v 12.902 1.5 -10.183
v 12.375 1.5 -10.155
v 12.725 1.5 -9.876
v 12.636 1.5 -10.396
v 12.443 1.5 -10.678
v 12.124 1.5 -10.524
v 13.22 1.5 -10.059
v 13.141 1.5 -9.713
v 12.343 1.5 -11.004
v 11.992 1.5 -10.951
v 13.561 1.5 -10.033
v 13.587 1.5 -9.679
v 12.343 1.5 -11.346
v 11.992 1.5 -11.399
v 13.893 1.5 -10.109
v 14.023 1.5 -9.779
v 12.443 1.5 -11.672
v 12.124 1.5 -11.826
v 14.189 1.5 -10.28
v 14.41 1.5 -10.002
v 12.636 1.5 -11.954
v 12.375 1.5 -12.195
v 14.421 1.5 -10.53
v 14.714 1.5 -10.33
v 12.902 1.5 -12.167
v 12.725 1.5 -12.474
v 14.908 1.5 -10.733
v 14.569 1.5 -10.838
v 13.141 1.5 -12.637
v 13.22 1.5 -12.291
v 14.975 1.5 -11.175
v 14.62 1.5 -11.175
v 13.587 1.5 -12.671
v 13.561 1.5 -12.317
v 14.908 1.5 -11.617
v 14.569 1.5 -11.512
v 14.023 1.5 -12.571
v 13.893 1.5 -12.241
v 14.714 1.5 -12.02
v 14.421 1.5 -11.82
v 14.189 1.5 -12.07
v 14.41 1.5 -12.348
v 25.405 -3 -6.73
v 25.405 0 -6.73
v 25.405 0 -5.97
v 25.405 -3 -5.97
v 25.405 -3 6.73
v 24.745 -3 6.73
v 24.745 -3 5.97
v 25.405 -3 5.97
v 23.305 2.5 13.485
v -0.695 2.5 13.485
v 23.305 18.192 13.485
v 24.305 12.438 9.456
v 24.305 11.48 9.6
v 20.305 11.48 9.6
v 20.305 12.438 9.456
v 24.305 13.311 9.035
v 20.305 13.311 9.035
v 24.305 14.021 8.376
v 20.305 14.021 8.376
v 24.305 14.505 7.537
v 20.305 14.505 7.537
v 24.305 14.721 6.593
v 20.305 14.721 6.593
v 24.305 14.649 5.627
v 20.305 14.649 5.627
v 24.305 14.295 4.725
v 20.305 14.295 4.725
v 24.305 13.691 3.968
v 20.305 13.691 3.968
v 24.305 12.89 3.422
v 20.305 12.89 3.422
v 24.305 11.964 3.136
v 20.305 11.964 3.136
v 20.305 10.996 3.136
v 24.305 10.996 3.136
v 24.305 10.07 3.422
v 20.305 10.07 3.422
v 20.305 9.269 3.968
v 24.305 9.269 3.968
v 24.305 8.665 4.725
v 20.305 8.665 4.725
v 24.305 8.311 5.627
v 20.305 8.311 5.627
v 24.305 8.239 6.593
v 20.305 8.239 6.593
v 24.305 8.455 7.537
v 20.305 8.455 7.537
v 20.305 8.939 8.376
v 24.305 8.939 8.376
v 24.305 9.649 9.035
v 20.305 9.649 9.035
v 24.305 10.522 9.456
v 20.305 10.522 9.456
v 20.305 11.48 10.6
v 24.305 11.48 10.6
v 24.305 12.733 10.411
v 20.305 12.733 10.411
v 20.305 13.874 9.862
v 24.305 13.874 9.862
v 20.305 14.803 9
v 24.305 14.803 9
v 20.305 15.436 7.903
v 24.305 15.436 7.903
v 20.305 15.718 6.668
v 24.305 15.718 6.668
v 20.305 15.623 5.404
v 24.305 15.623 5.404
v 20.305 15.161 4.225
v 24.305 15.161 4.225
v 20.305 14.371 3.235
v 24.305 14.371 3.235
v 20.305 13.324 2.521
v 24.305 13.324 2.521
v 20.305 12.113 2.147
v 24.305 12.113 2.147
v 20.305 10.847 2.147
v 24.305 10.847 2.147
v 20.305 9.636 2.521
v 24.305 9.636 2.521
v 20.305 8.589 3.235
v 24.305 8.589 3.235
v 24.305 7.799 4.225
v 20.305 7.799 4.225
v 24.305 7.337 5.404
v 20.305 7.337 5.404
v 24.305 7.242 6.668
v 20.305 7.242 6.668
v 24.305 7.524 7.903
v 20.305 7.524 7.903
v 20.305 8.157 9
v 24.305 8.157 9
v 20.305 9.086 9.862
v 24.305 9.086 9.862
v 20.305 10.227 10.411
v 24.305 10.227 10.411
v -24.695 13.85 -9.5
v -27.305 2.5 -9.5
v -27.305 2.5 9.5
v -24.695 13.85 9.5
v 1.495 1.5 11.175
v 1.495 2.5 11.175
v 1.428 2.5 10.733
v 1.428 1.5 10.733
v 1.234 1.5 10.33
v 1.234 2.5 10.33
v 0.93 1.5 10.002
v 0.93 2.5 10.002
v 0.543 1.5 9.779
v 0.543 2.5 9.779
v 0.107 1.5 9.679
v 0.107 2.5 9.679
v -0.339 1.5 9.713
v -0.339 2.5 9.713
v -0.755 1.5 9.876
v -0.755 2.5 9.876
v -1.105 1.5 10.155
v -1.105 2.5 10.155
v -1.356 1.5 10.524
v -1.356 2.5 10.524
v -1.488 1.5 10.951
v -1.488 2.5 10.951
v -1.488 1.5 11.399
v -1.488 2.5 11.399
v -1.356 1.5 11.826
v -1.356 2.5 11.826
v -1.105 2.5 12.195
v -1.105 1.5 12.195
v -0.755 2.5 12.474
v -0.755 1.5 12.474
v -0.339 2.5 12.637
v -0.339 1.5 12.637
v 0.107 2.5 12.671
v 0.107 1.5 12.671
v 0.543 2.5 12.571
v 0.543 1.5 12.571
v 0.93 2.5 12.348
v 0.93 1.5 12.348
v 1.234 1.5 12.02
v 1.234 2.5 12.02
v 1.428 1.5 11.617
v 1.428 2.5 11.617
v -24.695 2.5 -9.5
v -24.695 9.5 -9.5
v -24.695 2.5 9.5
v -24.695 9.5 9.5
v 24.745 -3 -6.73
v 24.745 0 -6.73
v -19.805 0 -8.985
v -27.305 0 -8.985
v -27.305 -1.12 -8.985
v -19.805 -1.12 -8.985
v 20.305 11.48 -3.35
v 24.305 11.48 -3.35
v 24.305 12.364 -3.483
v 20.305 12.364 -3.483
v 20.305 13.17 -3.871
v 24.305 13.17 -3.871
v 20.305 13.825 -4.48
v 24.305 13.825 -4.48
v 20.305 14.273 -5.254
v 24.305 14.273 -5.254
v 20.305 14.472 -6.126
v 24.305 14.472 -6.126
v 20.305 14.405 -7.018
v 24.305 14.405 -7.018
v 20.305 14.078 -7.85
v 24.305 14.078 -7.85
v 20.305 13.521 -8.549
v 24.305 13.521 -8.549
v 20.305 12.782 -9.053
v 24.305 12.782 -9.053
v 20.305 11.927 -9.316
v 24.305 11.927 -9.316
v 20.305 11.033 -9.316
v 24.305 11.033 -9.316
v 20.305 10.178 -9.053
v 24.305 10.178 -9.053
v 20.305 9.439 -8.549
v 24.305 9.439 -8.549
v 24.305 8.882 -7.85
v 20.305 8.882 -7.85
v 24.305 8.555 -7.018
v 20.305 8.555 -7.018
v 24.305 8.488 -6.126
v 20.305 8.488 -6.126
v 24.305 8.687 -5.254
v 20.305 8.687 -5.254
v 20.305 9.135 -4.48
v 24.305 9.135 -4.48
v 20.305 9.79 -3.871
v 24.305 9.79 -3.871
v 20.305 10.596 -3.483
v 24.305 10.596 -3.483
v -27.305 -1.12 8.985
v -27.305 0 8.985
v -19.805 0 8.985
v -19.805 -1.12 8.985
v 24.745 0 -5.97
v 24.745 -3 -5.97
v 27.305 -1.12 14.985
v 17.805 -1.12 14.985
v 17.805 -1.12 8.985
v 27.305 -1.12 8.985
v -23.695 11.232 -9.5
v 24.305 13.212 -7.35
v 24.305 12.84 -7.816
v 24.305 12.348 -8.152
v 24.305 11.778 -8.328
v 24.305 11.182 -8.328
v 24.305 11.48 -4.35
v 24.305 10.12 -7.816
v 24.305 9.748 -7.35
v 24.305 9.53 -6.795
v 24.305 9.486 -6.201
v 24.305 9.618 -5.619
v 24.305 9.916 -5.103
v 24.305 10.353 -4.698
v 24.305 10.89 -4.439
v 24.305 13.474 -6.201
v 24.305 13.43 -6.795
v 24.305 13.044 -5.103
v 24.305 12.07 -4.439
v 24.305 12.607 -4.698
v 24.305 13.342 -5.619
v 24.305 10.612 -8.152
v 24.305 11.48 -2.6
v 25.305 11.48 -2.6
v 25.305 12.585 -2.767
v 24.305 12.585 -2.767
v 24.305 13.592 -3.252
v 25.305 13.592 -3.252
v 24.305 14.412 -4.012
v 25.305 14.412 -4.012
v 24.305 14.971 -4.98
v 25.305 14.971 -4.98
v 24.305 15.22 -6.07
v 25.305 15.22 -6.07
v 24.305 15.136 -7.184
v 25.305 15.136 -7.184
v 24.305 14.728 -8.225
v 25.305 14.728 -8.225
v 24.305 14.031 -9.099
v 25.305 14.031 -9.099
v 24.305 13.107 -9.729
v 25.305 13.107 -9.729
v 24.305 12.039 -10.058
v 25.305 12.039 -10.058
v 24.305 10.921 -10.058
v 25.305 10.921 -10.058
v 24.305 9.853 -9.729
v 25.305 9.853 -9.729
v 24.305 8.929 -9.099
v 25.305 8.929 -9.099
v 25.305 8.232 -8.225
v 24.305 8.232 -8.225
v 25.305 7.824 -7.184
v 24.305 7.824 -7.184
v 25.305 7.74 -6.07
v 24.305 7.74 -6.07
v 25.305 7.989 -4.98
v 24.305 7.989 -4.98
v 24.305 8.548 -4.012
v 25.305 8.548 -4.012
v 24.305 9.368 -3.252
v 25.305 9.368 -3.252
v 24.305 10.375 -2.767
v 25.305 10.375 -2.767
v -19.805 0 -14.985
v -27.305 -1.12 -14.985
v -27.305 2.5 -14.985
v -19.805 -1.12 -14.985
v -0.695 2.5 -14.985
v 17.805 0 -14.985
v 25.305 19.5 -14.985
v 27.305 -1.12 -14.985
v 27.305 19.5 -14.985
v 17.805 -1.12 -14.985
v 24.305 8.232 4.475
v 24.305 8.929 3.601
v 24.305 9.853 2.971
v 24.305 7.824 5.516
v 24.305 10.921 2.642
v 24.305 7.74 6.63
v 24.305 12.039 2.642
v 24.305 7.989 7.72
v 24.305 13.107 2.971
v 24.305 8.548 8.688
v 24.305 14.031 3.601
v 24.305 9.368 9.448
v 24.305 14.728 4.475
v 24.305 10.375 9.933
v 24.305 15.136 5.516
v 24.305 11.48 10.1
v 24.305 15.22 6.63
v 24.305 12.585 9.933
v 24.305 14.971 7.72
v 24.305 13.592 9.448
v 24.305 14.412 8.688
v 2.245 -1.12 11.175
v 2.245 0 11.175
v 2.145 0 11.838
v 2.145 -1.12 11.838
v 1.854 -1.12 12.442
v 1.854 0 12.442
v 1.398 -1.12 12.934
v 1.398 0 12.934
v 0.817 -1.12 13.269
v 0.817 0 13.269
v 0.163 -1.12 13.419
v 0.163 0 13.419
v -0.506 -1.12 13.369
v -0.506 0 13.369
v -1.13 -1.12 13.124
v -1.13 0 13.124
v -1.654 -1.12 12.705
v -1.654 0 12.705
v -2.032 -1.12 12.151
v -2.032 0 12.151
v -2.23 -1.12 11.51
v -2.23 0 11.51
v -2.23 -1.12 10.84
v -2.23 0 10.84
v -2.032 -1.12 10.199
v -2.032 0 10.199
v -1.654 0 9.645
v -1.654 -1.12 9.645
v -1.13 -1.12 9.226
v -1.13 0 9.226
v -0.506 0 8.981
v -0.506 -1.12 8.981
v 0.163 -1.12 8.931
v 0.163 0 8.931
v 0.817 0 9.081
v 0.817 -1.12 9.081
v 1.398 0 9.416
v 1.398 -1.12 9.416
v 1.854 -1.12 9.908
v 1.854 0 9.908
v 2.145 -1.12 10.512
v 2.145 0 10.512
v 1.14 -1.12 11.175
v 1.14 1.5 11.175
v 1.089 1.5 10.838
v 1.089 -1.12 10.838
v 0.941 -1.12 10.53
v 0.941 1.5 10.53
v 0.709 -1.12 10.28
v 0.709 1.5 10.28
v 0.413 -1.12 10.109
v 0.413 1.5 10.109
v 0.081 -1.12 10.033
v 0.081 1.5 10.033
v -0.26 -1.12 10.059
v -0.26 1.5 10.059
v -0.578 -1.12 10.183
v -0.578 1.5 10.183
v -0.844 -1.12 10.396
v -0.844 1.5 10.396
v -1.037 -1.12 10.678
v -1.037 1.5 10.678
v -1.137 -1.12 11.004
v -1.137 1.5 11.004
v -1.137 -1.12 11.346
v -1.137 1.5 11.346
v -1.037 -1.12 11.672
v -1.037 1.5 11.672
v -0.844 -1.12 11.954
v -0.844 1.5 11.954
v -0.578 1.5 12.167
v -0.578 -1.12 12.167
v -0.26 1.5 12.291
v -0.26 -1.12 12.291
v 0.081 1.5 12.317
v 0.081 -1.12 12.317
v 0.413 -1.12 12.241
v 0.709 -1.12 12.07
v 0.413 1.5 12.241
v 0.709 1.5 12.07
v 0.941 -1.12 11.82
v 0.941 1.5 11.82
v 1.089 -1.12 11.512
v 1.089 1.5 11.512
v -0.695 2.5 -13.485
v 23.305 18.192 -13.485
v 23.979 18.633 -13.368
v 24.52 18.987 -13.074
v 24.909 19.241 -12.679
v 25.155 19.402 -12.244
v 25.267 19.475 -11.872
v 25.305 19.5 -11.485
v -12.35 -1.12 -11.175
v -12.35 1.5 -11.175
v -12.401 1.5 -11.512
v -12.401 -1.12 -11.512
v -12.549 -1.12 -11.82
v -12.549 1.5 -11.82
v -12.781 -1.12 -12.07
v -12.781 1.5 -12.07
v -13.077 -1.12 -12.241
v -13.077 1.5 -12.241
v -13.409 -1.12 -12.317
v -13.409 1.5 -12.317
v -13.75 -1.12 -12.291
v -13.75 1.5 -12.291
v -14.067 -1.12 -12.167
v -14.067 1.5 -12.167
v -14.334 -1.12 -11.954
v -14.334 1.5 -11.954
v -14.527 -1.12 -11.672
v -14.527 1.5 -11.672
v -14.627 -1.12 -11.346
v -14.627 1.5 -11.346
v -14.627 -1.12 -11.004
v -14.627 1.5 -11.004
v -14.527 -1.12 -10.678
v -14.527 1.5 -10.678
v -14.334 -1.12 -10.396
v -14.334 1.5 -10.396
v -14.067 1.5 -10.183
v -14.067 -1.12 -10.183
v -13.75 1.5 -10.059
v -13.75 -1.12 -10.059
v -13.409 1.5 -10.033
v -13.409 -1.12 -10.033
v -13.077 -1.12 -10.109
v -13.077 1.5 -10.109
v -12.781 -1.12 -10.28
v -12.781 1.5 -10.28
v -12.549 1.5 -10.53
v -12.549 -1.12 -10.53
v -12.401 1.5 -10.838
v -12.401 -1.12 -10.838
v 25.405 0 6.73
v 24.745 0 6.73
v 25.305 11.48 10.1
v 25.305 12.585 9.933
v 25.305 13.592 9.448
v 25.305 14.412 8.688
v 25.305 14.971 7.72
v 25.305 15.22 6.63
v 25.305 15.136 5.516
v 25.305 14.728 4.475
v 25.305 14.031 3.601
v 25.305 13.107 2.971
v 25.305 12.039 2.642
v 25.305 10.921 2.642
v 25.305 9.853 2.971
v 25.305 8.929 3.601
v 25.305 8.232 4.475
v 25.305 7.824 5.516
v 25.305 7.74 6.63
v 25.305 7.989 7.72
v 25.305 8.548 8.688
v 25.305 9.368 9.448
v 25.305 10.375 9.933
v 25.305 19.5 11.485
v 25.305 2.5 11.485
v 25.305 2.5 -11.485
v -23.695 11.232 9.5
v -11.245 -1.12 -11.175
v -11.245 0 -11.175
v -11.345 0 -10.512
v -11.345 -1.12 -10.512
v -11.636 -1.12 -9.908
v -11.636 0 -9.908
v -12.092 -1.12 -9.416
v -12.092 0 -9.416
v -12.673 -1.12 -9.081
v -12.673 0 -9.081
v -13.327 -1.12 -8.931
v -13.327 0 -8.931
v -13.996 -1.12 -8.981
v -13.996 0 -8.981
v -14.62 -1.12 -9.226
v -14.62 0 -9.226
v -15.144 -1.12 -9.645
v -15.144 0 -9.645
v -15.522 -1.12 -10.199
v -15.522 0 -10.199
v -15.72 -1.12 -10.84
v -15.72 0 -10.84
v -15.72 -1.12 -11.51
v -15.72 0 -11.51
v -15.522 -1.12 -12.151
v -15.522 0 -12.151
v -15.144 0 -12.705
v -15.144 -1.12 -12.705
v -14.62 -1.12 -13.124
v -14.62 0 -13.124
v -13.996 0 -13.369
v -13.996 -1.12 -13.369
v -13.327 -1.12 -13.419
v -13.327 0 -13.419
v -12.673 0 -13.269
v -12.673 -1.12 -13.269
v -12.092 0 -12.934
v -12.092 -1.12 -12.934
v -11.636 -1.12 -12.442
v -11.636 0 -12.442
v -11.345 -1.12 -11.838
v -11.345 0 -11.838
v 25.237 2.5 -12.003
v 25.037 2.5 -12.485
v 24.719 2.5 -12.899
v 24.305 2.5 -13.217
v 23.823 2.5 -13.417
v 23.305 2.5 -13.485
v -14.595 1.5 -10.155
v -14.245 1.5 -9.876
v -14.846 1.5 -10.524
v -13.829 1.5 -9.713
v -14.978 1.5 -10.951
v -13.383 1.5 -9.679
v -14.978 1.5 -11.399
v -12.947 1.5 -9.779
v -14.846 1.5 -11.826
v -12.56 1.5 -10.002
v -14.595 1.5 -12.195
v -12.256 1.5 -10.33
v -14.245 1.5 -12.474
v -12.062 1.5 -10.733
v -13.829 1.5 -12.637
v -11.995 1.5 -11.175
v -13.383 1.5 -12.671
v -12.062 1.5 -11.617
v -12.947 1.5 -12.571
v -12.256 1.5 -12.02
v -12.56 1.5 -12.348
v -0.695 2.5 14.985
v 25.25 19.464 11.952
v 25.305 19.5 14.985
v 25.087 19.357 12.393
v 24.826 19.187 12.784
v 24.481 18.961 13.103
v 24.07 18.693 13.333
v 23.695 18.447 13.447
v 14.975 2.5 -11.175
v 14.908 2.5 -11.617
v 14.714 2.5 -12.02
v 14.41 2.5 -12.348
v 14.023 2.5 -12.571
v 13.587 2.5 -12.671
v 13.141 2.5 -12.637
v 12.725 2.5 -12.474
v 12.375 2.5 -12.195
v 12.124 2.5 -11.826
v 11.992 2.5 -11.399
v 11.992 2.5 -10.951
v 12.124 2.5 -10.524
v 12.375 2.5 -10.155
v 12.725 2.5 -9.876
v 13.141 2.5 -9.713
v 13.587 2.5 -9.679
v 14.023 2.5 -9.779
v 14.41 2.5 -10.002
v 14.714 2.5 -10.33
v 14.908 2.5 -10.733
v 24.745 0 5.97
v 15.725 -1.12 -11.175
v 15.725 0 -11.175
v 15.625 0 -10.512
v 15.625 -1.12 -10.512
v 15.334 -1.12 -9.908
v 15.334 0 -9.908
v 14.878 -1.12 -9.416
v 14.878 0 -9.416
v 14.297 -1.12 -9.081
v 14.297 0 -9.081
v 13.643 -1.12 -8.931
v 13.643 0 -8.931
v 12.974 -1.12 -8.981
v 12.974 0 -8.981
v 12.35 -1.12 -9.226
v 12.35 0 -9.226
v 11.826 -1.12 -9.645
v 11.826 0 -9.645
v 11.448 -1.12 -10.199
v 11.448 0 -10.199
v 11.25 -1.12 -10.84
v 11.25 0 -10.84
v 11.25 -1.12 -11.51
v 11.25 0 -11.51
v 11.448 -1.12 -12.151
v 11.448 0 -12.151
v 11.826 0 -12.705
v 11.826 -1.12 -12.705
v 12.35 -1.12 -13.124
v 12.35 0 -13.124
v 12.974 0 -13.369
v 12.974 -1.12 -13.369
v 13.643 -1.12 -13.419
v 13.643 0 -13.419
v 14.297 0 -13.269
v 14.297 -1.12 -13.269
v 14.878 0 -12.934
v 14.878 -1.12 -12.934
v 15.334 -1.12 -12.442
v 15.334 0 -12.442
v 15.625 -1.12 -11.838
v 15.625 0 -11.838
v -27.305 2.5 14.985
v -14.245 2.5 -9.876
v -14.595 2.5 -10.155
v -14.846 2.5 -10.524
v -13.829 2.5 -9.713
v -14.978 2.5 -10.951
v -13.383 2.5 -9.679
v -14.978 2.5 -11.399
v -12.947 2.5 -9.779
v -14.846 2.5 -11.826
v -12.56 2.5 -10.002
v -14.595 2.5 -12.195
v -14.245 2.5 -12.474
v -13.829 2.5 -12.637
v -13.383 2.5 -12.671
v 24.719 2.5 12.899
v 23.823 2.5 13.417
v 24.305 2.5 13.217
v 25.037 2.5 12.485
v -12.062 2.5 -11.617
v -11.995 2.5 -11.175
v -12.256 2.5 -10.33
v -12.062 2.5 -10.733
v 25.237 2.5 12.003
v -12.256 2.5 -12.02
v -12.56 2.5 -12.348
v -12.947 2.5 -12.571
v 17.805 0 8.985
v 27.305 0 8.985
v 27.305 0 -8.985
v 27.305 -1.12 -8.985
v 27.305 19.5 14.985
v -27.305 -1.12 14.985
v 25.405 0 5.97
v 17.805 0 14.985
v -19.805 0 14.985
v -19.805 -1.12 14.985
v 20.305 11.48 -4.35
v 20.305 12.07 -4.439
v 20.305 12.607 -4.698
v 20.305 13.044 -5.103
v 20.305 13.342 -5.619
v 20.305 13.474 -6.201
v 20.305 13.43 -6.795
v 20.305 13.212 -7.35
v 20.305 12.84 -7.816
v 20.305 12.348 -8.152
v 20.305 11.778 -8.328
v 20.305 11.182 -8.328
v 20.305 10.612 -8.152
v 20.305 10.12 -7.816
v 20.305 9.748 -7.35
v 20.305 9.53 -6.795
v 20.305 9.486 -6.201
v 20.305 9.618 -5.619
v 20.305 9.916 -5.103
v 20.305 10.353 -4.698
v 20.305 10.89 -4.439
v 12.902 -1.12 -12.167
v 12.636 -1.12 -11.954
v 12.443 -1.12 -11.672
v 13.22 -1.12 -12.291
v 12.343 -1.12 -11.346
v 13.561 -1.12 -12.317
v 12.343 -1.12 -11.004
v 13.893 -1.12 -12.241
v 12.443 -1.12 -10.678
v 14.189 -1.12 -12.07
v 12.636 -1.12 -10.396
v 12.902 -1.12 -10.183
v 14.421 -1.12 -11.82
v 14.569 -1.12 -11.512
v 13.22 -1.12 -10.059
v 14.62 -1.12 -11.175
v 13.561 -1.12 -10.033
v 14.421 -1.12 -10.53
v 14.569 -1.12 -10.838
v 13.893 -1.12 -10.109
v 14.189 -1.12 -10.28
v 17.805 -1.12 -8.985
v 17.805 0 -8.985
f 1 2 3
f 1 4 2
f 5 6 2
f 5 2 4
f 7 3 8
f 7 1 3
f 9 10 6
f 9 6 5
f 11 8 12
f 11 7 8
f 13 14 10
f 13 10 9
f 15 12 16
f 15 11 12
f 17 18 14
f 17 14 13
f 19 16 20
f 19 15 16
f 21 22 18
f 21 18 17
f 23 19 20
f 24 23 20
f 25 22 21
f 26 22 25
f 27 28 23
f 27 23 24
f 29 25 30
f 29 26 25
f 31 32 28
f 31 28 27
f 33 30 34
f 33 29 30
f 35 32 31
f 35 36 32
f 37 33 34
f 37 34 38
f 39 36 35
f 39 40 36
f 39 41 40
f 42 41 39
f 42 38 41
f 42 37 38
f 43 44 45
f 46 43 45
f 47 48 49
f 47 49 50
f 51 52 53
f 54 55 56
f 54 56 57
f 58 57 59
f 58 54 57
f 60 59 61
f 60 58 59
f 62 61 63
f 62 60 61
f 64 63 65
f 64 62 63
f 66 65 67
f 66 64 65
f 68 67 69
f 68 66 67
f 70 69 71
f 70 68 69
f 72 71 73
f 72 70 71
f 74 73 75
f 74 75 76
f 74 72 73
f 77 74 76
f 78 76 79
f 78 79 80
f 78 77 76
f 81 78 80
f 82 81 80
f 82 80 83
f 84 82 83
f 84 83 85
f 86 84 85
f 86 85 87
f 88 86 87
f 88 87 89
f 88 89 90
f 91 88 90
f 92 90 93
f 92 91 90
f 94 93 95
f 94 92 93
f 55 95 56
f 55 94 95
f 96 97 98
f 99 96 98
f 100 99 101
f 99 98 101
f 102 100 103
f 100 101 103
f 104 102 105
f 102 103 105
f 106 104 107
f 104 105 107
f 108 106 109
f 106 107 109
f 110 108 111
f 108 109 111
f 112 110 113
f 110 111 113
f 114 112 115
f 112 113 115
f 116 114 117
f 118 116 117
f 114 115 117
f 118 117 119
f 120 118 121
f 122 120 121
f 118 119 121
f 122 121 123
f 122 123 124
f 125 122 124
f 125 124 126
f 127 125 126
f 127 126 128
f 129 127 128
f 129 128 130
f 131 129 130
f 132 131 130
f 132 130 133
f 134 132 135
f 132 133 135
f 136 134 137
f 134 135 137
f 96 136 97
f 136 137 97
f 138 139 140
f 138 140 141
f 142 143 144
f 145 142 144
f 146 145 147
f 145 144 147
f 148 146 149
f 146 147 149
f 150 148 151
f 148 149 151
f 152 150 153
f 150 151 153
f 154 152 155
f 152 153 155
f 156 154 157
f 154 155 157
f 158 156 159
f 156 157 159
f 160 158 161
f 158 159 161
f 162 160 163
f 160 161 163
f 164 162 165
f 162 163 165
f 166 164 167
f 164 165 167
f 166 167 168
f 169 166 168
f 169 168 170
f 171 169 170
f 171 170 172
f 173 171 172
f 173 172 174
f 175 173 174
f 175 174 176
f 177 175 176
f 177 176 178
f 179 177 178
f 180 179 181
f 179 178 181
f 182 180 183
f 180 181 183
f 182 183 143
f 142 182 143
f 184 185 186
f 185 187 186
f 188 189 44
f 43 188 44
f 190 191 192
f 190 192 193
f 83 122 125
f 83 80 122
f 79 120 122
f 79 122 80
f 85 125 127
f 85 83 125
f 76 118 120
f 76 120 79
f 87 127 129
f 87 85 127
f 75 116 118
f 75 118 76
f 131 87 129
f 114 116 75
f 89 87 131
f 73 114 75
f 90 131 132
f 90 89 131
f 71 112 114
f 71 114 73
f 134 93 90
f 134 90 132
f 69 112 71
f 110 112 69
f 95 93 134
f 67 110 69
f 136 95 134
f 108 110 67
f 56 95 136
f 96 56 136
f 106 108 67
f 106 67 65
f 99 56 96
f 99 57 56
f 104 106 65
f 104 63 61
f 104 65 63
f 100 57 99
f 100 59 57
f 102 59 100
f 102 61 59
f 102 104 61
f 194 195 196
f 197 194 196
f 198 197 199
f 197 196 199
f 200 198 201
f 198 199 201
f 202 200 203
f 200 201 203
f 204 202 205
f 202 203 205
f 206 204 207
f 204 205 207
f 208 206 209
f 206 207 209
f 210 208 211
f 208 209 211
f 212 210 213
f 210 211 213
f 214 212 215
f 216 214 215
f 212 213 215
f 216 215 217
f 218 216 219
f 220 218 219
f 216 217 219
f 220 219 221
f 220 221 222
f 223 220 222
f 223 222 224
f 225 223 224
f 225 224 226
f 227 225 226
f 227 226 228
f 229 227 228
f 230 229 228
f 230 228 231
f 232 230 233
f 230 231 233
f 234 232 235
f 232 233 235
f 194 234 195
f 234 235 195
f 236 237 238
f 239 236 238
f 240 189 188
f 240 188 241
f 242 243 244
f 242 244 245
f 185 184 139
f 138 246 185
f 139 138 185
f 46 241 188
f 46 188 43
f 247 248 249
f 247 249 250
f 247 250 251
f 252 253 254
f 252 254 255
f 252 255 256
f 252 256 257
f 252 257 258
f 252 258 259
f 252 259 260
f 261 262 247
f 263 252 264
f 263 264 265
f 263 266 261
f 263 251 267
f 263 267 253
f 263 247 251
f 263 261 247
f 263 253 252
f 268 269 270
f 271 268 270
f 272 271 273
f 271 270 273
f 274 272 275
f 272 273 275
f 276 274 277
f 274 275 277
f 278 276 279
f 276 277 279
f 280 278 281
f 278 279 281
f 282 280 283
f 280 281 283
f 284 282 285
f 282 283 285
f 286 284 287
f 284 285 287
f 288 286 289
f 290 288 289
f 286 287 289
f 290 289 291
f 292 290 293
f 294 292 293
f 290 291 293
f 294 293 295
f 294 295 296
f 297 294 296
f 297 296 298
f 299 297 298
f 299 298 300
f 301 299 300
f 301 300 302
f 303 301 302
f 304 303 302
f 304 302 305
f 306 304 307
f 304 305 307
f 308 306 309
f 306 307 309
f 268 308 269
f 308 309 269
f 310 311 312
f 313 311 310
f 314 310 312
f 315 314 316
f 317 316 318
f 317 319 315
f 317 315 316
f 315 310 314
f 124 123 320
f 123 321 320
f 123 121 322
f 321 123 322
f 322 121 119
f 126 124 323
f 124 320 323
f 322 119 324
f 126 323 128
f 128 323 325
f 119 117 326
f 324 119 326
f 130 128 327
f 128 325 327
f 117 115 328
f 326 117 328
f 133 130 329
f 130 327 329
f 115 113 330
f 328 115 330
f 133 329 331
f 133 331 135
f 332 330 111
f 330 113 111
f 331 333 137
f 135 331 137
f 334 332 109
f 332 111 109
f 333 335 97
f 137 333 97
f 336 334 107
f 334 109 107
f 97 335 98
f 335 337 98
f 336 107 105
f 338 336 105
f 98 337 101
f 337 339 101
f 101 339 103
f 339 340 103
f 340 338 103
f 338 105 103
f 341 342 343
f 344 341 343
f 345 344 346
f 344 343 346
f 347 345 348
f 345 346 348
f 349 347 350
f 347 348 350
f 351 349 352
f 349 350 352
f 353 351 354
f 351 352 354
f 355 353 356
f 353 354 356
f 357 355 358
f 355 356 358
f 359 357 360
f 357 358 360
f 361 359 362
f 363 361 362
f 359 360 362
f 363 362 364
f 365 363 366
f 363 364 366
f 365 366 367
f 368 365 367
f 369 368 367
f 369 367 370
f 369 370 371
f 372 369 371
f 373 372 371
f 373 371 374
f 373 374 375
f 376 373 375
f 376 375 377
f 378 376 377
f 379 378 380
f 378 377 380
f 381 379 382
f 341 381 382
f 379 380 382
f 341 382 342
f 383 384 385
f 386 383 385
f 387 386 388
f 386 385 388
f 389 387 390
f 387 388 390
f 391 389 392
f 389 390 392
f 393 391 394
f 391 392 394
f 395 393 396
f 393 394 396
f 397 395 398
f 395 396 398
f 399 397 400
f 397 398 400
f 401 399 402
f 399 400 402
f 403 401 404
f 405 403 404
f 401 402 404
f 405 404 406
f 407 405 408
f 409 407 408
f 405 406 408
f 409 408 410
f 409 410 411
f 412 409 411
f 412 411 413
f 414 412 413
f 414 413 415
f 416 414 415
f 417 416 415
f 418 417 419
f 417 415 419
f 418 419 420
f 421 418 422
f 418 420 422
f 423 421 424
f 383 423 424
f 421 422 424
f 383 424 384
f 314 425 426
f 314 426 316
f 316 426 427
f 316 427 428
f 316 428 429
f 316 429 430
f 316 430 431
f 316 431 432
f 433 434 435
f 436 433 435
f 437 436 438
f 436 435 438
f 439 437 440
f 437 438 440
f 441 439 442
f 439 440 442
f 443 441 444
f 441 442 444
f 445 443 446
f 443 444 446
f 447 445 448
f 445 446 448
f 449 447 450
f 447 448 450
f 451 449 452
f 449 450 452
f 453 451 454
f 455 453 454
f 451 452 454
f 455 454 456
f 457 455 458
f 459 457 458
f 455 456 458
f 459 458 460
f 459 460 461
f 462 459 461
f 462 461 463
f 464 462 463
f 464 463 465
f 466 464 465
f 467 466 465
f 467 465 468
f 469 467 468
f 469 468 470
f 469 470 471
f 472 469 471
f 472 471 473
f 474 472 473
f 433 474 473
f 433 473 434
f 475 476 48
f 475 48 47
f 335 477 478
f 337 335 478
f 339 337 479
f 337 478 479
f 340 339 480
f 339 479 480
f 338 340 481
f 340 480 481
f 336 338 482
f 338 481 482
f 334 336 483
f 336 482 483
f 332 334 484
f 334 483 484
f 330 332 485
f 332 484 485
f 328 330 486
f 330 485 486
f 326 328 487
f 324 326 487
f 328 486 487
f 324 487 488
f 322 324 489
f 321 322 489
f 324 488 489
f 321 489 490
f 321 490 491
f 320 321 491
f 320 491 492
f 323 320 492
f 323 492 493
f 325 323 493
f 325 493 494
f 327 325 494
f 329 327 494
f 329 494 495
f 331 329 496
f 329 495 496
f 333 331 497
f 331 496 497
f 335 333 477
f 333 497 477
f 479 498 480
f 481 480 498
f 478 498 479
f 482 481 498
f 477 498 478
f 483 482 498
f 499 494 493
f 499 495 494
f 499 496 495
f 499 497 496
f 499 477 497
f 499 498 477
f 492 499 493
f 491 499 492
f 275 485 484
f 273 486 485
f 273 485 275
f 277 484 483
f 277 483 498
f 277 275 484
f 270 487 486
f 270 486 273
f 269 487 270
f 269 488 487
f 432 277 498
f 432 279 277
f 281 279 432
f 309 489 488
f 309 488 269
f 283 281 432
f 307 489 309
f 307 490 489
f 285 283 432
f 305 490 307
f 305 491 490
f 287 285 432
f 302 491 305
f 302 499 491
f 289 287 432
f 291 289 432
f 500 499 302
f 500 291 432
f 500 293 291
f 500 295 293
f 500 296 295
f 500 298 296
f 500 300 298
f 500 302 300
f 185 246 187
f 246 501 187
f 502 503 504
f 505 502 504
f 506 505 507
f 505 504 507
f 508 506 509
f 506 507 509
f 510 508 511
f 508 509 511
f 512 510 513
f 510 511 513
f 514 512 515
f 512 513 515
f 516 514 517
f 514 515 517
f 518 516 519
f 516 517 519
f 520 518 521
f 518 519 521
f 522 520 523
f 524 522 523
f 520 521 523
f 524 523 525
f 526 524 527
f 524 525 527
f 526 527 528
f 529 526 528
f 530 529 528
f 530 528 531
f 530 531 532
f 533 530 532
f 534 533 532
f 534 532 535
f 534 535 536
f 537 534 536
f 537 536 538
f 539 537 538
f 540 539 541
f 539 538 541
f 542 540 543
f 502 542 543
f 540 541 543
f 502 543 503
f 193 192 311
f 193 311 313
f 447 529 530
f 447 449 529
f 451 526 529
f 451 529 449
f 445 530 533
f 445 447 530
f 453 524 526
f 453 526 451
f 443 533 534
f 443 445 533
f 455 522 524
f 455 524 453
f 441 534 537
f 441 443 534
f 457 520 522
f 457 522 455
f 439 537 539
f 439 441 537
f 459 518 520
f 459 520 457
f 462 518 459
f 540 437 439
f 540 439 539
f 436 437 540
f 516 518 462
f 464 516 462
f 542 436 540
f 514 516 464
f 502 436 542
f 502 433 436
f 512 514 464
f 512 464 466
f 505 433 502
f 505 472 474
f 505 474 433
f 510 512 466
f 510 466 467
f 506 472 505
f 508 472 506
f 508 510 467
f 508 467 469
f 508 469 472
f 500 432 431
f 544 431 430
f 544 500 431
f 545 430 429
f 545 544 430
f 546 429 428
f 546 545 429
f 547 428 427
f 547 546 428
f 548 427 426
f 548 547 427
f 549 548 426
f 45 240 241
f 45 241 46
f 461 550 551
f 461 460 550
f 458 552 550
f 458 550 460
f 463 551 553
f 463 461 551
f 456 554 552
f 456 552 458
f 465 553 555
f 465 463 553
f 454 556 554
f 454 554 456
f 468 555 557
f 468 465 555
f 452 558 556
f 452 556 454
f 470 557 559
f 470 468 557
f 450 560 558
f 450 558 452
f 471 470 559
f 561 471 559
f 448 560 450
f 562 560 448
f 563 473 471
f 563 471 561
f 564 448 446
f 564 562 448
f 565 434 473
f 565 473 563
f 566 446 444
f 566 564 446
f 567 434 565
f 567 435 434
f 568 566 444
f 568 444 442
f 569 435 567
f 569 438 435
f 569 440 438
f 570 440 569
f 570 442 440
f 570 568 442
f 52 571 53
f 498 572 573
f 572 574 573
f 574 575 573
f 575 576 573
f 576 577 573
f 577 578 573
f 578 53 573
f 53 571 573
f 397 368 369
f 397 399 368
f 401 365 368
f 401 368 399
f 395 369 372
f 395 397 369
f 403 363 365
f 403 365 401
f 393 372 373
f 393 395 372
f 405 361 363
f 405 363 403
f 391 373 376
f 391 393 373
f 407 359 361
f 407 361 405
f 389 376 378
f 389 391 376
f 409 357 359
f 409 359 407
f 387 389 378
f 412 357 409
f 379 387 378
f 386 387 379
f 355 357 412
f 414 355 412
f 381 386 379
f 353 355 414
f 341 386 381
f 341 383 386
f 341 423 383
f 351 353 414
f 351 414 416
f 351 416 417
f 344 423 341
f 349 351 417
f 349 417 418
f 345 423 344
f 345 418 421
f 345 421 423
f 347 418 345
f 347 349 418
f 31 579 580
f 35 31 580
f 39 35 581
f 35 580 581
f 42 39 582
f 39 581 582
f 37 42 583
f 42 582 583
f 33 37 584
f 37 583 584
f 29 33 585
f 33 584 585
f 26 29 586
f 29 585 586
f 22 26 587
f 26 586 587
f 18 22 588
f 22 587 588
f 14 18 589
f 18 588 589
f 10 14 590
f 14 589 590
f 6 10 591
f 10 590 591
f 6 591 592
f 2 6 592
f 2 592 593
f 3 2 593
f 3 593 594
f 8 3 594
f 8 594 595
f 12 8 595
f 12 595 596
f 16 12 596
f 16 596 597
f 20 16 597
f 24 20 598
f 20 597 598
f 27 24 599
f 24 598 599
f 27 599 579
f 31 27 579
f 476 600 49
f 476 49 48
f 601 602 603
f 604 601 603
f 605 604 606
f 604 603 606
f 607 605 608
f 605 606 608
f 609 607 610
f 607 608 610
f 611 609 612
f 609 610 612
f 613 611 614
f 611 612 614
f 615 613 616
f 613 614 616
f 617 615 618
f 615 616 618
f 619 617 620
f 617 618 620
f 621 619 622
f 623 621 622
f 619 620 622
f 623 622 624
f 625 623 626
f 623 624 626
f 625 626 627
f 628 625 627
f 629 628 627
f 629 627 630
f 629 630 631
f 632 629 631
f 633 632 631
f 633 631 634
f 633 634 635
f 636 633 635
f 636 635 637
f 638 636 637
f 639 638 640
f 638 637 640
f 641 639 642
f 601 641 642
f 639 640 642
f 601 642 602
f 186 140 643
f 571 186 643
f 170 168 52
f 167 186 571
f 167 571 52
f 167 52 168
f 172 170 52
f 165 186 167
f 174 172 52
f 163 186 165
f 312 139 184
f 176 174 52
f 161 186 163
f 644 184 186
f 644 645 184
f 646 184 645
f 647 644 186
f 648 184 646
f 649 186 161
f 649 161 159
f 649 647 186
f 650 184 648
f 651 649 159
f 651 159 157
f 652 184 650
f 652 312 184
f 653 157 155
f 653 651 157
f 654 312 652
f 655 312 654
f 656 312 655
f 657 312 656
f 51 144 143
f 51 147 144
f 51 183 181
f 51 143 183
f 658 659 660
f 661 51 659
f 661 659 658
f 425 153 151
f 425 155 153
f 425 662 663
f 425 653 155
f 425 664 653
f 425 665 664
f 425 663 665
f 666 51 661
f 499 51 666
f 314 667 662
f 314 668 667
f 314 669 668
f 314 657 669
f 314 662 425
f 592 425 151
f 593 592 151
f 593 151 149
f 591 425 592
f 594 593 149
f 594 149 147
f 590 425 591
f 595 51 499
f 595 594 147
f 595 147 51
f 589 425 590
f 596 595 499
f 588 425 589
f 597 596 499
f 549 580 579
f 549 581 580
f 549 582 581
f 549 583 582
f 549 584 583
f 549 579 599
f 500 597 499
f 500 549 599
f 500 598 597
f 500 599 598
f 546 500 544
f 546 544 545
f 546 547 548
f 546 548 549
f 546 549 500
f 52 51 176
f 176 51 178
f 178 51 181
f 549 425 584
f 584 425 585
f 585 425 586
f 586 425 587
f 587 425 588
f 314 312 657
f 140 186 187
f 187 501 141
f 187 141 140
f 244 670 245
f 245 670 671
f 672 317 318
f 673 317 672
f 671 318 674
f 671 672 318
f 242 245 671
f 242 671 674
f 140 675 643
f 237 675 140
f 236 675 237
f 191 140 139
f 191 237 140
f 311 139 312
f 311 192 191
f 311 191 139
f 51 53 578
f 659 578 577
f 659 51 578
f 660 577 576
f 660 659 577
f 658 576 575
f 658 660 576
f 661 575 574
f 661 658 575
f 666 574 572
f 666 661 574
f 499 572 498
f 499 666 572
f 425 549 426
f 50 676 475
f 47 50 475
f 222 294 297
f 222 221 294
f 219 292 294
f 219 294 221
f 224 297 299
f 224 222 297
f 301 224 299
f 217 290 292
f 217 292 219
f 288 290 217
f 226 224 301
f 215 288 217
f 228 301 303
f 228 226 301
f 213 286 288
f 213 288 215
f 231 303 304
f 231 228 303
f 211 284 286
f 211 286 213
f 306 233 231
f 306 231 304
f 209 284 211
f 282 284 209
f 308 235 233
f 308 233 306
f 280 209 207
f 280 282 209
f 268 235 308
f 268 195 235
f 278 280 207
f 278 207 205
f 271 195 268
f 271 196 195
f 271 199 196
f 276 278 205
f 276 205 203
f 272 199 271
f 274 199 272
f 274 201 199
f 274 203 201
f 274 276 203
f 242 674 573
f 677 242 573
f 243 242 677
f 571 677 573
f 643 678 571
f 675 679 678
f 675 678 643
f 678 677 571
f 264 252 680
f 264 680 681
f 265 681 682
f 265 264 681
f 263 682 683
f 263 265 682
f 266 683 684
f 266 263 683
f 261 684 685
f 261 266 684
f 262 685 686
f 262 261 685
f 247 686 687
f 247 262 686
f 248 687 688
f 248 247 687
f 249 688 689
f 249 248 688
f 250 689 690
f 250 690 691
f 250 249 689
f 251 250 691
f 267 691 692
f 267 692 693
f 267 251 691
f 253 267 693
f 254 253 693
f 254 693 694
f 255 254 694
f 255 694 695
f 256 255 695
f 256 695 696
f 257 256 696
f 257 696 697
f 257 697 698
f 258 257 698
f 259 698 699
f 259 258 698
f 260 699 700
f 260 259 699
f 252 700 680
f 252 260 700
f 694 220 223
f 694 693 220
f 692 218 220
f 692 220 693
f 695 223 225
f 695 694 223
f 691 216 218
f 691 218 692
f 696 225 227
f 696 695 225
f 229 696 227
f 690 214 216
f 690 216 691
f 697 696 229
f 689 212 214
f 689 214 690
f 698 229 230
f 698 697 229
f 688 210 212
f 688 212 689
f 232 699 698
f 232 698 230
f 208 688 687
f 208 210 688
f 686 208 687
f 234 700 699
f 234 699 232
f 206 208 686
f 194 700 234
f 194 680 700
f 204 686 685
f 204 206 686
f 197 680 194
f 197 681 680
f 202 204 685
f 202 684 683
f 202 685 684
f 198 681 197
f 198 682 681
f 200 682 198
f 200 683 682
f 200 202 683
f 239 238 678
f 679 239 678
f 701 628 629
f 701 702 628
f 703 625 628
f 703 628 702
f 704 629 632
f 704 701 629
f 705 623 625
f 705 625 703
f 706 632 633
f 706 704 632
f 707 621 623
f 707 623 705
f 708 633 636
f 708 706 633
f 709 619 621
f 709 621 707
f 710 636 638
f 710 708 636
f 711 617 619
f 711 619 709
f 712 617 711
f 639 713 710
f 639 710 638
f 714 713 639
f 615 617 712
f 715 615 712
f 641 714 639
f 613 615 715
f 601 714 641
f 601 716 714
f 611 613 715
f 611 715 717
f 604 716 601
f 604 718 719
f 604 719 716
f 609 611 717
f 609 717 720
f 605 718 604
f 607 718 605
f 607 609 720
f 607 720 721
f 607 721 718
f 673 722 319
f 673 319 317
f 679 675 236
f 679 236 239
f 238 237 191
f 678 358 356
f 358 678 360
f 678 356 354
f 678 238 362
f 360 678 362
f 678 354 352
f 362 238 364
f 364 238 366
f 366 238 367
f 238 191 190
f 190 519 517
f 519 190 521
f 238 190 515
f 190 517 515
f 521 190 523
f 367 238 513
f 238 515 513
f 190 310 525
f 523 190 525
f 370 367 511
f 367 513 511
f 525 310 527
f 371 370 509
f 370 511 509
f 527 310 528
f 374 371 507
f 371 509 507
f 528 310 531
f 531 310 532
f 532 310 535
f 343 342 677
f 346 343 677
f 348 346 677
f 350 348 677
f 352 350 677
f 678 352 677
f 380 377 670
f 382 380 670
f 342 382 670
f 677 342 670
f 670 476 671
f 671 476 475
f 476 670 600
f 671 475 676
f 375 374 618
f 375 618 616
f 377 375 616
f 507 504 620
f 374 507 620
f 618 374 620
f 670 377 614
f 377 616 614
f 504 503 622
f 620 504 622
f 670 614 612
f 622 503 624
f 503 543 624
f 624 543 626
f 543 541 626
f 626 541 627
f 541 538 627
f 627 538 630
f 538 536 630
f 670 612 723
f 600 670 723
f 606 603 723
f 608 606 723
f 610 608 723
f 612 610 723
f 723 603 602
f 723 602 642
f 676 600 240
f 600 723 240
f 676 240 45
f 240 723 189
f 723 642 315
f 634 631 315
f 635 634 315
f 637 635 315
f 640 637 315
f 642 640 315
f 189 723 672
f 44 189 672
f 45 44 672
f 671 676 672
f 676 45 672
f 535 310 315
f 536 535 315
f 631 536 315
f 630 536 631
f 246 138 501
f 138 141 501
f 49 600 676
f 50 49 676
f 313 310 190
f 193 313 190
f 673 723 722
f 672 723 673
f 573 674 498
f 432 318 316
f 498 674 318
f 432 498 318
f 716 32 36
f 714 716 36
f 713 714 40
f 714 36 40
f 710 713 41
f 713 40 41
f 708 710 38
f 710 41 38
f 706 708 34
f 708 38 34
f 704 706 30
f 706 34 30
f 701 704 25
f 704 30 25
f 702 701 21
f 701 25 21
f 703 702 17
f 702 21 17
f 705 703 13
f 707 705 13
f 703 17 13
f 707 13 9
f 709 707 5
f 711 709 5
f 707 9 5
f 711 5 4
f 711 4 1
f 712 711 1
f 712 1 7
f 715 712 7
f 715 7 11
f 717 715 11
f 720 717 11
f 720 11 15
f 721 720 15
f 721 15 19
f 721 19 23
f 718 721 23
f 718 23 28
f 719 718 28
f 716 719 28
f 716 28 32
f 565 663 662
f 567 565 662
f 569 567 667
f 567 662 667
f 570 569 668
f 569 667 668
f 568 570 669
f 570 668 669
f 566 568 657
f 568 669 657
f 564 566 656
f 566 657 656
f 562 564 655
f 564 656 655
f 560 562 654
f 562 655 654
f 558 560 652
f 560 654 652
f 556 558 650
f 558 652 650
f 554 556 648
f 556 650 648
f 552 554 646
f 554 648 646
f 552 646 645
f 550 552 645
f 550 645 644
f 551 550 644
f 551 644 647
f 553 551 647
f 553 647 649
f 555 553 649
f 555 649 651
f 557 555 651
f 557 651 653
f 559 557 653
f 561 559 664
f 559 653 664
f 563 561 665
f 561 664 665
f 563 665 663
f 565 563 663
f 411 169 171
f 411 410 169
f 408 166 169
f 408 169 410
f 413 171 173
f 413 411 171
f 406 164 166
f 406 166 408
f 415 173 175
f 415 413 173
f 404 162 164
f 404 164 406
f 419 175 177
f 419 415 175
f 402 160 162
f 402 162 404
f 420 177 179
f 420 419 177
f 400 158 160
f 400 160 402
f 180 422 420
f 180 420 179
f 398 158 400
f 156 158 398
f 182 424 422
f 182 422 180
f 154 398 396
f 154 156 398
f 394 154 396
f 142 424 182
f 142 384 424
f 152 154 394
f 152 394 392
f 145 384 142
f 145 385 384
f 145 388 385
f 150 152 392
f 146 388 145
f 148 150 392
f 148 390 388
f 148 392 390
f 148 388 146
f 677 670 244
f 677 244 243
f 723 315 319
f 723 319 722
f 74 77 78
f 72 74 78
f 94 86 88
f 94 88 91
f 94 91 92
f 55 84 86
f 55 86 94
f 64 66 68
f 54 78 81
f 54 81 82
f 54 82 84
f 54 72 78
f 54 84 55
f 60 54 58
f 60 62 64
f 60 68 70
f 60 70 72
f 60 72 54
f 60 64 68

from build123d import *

# Parameters (mm, degrees)
SKETCH_1_W           = 54.61
SKETCH_1_H           = 29.97
EXTRUDE_1_DEPTH      = 2.5
EXTRUDE_2_DEPTH      = 17
CUT_EXTRUDE_1_DEPTH  = 30.97
SKETCH_4_R           = 1.145
CUT_EXTRUDE_2_DEPTH  = 3.5
SKETCH_5_R           = 2.25
SKETCH_5_W           = 7.5
SKETCH_5_H           = 6
SKETCH_5_W_2         = 9.5
EXTRUDE_3_DEPTH      = 1.12
SKETCH_6_R           = 1.145
CUT_EXTRUDE_3_DEPTH  = 4.62
SKETCH_7_R           = 1.5
CUT_EXTRUDE_4_DEPTH  = 1
EXTRUDE_4_DEPTH      = 9.5
EXTRUDE_4_DEPTH_BACK = 9.5
SKETCH_9_W           = 0.66
SKETCH_9_H           = 0.76
EXTRUDE_5_DEPTH      = 3
SKETCH_10_R          = 3.75
EXTRUDE_6_DEPTH      = 1
SKETCH_11_R          = 3
SKETCH_11_R_2        = 2
EXTRUDE_7_DEPTH      = 4
SKETCH_12_R          = 4.25
SKETCH_12_R_2        = 3.25
EXTRUDE_8_DEPTH      = 4


with BuildPart() as part:
    # Эскиз1 → Бобышка-Вытянуть1 (new body)
    with BuildSketch(Plane(origin=(0, 0, 0), x_dir=(1, 0, 0), z_dir=(0, 1, 0))):
        Rectangle(SKETCH_1_W, SKETCH_1_H)
    extrude(amount=EXTRUDE_1_DEPTH)

    # Эскиз2 → Бобышка-Вытянуть2 (add)
    with BuildSketch(Plane(origin=(0, 2.5, 0), x_dir=(1, 0, 0), z_dir=(0, 1, 0))):
        with BuildLine():
            Line((27.305, -14.985), (-0.695, -14.985))
            Line((-0.695, -14.985), (-0.695, -13.485))
            Line((-0.695, -13.485), (23.305, -13.485))
            ThreePointArc((23.305, -13.485), (24.719213562, -12.899213562), (25.305, -11.485))
            Line((25.305, -11.485), (25.305, 11.485))
            ThreePointArc((25.305, 11.485), (24.719213562, 12.899213562), (23.305, 13.485))
            Line((23.305, 13.485), (-0.695, 13.485))
            Line((-0.695, 13.485), (-0.695, 14.985))
            Line((-0.695, 14.985), (27.305, 14.985))
            Line((27.305, 14.985), (27.305, -14.985))
        make_face()
    extrude(amount=EXTRUDE_2_DEPTH)

    # Эскиз3 → Вырез-Вытянуть1 (cut, through all)
    with BuildSketch(Plane.XY.offset(14.985)):
        Polygon((-0.695, 2.5), (25.305, 19.5), (-0.695, 19.5), align=None)
    extrude(amount=-CUT_EXTRUDE_1_DEPTH, mode=Mode.SUBTRACT)

    # Эскиз4 → Вырез-Вытянуть2 (cut, through all)
    with BuildSketch(Plane(origin=(0, 2.5, 0), x_dir=(1, 0, 0), z_dir=(0, 1, 0))):
        with Locations((-13.495, 11.175)):
            Circle(SKETCH_4_R)
        with Locations((-0.005, -11.175)):
            Circle(SKETCH_4_R)
        with Locations((13.475, 11.175)):
            Circle(SKETCH_4_R)
    extrude(amount=-CUT_EXTRUDE_2_DEPTH, mode=Mode.SUBTRACT)

    # Эскиз5 → Бобышка-Вытянуть3 (add)
    with BuildSketch(Plane.XZ):
        with Locations((-0.005, 11.175)):
            Circle(SKETCH_5_R)
        with Locations((13.475, -11.175)):
            Circle(SKETCH_5_R)
        with Locations((-13.495, -11.175)):
            Circle(SKETCH_5_R)
        with Locations((-23.555, 11.985)):
            Rectangle(SKETCH_5_W, SKETCH_5_H)
        with Locations((22.555, 11.985)):
            Rectangle(SKETCH_5_W_2, SKETCH_5_H)
        with Locations((22.555, -11.985)):
            Rectangle(SKETCH_5_W_2, SKETCH_5_H)
        with Locations((-23.555, -11.985)):
            Rectangle(SKETCH_5_W, SKETCH_5_H)
    extrude(amount=EXTRUDE_3_DEPTH)

    # Эскиз6 → Вырез-Вытянуть3 (cut, through all)
    with BuildSketch(Plane(origin=(0, 2.5, 0), x_dir=(1, 0, 0), z_dir=(0, 1, 0))):
        with Locations((-13.495, 11.175)):
            Circle(SKETCH_6_R)
        with Locations((13.475, 11.175)):
            Circle(SKETCH_6_R)
        with Locations((-0.005, -11.175)):
            Circle(SKETCH_6_R)
    extrude(amount=-CUT_EXTRUDE_3_DEPTH, mode=Mode.SUBTRACT)

    # Эскиз7 → Вырез-Вытянуть4 (cut)
    with BuildSketch(Plane(origin=(0, 2.5, 0), x_dir=(1, 0, 0), z_dir=(0, 1, 0))):
        with Locations((-13.495, 11.175)):
            Circle(SKETCH_7_R)
        with Locations((13.475, 11.175)):
            Circle(SKETCH_7_R)
        with Locations((-0.005, -11.175)):
            Circle(SKETCH_7_R)
    extrude(amount=-CUT_EXTRUDE_4_DEPTH, mode=Mode.SUBTRACT)

    # Эскиз8 → Бобышка-Вытянуть4 (add, two sides)
    with BuildSketch(Plane.XY) as extrude_4_sk:
        Polygon((-27.305, 2.5), (-24.695, 13.85), (-23.695, 11.232050808), (-24.695, 9.5), (-24.695, 2.5), align=None)
    extrude(amount=EXTRUDE_4_DEPTH)
    extrude(extrude_4_sk.sketch, amount=-EXTRUDE_4_DEPTH_BACK)

    # Эскиз9 → Бобышка-Вытянуть5 (add)
    with BuildSketch(Plane.XZ):
        with Locations((25.075, 6.35)):
            Rectangle(SKETCH_9_W, SKETCH_9_H)
        with Locations((25.075, -6.35)):
            Rectangle(SKETCH_9_W, SKETCH_9_H)
    extrude(amount=EXTRUDE_5_DEPTH)

    # Эскиз10 → Бобышка-Вытянуть6 (add)
    with BuildSketch(Plane.ZY.offset(-25.305)):
        with Locations((-6.35, 11.48)):
            Circle(SKETCH_10_R)
        with Locations((6.35, 11.48)):
            Circle(SKETCH_10_R)
    extrude(amount=EXTRUDE_6_DEPTH)

    # Эскиз11 → Бобышка-Вытянуть7 (add)
    with BuildSketch(Plane.ZY.offset(-24.305)):
        with Locations((-6.35, 11.48)):
            Circle(SKETCH_11_R)
        with Locations((-6.35, 11.48)):
            Circle(SKETCH_11_R_2, mode=Mode.SUBTRACT)
    extrude(amount=EXTRUDE_7_DEPTH)

    # Эскиз12 → Бобышка-Вытянуть8 (add)
    with BuildSketch(Plane.ZY.offset(-24.305)):
        with Locations((6.35, 11.48)):
            Circle(SKETCH_12_R)
        with Locations((6.35, 11.48)):
            Circle(SKETCH_12_R_2, mode=Mode.SUBTRACT)
    extrude(amount=EXTRUDE_8_DEPTH)


solid = part.part
